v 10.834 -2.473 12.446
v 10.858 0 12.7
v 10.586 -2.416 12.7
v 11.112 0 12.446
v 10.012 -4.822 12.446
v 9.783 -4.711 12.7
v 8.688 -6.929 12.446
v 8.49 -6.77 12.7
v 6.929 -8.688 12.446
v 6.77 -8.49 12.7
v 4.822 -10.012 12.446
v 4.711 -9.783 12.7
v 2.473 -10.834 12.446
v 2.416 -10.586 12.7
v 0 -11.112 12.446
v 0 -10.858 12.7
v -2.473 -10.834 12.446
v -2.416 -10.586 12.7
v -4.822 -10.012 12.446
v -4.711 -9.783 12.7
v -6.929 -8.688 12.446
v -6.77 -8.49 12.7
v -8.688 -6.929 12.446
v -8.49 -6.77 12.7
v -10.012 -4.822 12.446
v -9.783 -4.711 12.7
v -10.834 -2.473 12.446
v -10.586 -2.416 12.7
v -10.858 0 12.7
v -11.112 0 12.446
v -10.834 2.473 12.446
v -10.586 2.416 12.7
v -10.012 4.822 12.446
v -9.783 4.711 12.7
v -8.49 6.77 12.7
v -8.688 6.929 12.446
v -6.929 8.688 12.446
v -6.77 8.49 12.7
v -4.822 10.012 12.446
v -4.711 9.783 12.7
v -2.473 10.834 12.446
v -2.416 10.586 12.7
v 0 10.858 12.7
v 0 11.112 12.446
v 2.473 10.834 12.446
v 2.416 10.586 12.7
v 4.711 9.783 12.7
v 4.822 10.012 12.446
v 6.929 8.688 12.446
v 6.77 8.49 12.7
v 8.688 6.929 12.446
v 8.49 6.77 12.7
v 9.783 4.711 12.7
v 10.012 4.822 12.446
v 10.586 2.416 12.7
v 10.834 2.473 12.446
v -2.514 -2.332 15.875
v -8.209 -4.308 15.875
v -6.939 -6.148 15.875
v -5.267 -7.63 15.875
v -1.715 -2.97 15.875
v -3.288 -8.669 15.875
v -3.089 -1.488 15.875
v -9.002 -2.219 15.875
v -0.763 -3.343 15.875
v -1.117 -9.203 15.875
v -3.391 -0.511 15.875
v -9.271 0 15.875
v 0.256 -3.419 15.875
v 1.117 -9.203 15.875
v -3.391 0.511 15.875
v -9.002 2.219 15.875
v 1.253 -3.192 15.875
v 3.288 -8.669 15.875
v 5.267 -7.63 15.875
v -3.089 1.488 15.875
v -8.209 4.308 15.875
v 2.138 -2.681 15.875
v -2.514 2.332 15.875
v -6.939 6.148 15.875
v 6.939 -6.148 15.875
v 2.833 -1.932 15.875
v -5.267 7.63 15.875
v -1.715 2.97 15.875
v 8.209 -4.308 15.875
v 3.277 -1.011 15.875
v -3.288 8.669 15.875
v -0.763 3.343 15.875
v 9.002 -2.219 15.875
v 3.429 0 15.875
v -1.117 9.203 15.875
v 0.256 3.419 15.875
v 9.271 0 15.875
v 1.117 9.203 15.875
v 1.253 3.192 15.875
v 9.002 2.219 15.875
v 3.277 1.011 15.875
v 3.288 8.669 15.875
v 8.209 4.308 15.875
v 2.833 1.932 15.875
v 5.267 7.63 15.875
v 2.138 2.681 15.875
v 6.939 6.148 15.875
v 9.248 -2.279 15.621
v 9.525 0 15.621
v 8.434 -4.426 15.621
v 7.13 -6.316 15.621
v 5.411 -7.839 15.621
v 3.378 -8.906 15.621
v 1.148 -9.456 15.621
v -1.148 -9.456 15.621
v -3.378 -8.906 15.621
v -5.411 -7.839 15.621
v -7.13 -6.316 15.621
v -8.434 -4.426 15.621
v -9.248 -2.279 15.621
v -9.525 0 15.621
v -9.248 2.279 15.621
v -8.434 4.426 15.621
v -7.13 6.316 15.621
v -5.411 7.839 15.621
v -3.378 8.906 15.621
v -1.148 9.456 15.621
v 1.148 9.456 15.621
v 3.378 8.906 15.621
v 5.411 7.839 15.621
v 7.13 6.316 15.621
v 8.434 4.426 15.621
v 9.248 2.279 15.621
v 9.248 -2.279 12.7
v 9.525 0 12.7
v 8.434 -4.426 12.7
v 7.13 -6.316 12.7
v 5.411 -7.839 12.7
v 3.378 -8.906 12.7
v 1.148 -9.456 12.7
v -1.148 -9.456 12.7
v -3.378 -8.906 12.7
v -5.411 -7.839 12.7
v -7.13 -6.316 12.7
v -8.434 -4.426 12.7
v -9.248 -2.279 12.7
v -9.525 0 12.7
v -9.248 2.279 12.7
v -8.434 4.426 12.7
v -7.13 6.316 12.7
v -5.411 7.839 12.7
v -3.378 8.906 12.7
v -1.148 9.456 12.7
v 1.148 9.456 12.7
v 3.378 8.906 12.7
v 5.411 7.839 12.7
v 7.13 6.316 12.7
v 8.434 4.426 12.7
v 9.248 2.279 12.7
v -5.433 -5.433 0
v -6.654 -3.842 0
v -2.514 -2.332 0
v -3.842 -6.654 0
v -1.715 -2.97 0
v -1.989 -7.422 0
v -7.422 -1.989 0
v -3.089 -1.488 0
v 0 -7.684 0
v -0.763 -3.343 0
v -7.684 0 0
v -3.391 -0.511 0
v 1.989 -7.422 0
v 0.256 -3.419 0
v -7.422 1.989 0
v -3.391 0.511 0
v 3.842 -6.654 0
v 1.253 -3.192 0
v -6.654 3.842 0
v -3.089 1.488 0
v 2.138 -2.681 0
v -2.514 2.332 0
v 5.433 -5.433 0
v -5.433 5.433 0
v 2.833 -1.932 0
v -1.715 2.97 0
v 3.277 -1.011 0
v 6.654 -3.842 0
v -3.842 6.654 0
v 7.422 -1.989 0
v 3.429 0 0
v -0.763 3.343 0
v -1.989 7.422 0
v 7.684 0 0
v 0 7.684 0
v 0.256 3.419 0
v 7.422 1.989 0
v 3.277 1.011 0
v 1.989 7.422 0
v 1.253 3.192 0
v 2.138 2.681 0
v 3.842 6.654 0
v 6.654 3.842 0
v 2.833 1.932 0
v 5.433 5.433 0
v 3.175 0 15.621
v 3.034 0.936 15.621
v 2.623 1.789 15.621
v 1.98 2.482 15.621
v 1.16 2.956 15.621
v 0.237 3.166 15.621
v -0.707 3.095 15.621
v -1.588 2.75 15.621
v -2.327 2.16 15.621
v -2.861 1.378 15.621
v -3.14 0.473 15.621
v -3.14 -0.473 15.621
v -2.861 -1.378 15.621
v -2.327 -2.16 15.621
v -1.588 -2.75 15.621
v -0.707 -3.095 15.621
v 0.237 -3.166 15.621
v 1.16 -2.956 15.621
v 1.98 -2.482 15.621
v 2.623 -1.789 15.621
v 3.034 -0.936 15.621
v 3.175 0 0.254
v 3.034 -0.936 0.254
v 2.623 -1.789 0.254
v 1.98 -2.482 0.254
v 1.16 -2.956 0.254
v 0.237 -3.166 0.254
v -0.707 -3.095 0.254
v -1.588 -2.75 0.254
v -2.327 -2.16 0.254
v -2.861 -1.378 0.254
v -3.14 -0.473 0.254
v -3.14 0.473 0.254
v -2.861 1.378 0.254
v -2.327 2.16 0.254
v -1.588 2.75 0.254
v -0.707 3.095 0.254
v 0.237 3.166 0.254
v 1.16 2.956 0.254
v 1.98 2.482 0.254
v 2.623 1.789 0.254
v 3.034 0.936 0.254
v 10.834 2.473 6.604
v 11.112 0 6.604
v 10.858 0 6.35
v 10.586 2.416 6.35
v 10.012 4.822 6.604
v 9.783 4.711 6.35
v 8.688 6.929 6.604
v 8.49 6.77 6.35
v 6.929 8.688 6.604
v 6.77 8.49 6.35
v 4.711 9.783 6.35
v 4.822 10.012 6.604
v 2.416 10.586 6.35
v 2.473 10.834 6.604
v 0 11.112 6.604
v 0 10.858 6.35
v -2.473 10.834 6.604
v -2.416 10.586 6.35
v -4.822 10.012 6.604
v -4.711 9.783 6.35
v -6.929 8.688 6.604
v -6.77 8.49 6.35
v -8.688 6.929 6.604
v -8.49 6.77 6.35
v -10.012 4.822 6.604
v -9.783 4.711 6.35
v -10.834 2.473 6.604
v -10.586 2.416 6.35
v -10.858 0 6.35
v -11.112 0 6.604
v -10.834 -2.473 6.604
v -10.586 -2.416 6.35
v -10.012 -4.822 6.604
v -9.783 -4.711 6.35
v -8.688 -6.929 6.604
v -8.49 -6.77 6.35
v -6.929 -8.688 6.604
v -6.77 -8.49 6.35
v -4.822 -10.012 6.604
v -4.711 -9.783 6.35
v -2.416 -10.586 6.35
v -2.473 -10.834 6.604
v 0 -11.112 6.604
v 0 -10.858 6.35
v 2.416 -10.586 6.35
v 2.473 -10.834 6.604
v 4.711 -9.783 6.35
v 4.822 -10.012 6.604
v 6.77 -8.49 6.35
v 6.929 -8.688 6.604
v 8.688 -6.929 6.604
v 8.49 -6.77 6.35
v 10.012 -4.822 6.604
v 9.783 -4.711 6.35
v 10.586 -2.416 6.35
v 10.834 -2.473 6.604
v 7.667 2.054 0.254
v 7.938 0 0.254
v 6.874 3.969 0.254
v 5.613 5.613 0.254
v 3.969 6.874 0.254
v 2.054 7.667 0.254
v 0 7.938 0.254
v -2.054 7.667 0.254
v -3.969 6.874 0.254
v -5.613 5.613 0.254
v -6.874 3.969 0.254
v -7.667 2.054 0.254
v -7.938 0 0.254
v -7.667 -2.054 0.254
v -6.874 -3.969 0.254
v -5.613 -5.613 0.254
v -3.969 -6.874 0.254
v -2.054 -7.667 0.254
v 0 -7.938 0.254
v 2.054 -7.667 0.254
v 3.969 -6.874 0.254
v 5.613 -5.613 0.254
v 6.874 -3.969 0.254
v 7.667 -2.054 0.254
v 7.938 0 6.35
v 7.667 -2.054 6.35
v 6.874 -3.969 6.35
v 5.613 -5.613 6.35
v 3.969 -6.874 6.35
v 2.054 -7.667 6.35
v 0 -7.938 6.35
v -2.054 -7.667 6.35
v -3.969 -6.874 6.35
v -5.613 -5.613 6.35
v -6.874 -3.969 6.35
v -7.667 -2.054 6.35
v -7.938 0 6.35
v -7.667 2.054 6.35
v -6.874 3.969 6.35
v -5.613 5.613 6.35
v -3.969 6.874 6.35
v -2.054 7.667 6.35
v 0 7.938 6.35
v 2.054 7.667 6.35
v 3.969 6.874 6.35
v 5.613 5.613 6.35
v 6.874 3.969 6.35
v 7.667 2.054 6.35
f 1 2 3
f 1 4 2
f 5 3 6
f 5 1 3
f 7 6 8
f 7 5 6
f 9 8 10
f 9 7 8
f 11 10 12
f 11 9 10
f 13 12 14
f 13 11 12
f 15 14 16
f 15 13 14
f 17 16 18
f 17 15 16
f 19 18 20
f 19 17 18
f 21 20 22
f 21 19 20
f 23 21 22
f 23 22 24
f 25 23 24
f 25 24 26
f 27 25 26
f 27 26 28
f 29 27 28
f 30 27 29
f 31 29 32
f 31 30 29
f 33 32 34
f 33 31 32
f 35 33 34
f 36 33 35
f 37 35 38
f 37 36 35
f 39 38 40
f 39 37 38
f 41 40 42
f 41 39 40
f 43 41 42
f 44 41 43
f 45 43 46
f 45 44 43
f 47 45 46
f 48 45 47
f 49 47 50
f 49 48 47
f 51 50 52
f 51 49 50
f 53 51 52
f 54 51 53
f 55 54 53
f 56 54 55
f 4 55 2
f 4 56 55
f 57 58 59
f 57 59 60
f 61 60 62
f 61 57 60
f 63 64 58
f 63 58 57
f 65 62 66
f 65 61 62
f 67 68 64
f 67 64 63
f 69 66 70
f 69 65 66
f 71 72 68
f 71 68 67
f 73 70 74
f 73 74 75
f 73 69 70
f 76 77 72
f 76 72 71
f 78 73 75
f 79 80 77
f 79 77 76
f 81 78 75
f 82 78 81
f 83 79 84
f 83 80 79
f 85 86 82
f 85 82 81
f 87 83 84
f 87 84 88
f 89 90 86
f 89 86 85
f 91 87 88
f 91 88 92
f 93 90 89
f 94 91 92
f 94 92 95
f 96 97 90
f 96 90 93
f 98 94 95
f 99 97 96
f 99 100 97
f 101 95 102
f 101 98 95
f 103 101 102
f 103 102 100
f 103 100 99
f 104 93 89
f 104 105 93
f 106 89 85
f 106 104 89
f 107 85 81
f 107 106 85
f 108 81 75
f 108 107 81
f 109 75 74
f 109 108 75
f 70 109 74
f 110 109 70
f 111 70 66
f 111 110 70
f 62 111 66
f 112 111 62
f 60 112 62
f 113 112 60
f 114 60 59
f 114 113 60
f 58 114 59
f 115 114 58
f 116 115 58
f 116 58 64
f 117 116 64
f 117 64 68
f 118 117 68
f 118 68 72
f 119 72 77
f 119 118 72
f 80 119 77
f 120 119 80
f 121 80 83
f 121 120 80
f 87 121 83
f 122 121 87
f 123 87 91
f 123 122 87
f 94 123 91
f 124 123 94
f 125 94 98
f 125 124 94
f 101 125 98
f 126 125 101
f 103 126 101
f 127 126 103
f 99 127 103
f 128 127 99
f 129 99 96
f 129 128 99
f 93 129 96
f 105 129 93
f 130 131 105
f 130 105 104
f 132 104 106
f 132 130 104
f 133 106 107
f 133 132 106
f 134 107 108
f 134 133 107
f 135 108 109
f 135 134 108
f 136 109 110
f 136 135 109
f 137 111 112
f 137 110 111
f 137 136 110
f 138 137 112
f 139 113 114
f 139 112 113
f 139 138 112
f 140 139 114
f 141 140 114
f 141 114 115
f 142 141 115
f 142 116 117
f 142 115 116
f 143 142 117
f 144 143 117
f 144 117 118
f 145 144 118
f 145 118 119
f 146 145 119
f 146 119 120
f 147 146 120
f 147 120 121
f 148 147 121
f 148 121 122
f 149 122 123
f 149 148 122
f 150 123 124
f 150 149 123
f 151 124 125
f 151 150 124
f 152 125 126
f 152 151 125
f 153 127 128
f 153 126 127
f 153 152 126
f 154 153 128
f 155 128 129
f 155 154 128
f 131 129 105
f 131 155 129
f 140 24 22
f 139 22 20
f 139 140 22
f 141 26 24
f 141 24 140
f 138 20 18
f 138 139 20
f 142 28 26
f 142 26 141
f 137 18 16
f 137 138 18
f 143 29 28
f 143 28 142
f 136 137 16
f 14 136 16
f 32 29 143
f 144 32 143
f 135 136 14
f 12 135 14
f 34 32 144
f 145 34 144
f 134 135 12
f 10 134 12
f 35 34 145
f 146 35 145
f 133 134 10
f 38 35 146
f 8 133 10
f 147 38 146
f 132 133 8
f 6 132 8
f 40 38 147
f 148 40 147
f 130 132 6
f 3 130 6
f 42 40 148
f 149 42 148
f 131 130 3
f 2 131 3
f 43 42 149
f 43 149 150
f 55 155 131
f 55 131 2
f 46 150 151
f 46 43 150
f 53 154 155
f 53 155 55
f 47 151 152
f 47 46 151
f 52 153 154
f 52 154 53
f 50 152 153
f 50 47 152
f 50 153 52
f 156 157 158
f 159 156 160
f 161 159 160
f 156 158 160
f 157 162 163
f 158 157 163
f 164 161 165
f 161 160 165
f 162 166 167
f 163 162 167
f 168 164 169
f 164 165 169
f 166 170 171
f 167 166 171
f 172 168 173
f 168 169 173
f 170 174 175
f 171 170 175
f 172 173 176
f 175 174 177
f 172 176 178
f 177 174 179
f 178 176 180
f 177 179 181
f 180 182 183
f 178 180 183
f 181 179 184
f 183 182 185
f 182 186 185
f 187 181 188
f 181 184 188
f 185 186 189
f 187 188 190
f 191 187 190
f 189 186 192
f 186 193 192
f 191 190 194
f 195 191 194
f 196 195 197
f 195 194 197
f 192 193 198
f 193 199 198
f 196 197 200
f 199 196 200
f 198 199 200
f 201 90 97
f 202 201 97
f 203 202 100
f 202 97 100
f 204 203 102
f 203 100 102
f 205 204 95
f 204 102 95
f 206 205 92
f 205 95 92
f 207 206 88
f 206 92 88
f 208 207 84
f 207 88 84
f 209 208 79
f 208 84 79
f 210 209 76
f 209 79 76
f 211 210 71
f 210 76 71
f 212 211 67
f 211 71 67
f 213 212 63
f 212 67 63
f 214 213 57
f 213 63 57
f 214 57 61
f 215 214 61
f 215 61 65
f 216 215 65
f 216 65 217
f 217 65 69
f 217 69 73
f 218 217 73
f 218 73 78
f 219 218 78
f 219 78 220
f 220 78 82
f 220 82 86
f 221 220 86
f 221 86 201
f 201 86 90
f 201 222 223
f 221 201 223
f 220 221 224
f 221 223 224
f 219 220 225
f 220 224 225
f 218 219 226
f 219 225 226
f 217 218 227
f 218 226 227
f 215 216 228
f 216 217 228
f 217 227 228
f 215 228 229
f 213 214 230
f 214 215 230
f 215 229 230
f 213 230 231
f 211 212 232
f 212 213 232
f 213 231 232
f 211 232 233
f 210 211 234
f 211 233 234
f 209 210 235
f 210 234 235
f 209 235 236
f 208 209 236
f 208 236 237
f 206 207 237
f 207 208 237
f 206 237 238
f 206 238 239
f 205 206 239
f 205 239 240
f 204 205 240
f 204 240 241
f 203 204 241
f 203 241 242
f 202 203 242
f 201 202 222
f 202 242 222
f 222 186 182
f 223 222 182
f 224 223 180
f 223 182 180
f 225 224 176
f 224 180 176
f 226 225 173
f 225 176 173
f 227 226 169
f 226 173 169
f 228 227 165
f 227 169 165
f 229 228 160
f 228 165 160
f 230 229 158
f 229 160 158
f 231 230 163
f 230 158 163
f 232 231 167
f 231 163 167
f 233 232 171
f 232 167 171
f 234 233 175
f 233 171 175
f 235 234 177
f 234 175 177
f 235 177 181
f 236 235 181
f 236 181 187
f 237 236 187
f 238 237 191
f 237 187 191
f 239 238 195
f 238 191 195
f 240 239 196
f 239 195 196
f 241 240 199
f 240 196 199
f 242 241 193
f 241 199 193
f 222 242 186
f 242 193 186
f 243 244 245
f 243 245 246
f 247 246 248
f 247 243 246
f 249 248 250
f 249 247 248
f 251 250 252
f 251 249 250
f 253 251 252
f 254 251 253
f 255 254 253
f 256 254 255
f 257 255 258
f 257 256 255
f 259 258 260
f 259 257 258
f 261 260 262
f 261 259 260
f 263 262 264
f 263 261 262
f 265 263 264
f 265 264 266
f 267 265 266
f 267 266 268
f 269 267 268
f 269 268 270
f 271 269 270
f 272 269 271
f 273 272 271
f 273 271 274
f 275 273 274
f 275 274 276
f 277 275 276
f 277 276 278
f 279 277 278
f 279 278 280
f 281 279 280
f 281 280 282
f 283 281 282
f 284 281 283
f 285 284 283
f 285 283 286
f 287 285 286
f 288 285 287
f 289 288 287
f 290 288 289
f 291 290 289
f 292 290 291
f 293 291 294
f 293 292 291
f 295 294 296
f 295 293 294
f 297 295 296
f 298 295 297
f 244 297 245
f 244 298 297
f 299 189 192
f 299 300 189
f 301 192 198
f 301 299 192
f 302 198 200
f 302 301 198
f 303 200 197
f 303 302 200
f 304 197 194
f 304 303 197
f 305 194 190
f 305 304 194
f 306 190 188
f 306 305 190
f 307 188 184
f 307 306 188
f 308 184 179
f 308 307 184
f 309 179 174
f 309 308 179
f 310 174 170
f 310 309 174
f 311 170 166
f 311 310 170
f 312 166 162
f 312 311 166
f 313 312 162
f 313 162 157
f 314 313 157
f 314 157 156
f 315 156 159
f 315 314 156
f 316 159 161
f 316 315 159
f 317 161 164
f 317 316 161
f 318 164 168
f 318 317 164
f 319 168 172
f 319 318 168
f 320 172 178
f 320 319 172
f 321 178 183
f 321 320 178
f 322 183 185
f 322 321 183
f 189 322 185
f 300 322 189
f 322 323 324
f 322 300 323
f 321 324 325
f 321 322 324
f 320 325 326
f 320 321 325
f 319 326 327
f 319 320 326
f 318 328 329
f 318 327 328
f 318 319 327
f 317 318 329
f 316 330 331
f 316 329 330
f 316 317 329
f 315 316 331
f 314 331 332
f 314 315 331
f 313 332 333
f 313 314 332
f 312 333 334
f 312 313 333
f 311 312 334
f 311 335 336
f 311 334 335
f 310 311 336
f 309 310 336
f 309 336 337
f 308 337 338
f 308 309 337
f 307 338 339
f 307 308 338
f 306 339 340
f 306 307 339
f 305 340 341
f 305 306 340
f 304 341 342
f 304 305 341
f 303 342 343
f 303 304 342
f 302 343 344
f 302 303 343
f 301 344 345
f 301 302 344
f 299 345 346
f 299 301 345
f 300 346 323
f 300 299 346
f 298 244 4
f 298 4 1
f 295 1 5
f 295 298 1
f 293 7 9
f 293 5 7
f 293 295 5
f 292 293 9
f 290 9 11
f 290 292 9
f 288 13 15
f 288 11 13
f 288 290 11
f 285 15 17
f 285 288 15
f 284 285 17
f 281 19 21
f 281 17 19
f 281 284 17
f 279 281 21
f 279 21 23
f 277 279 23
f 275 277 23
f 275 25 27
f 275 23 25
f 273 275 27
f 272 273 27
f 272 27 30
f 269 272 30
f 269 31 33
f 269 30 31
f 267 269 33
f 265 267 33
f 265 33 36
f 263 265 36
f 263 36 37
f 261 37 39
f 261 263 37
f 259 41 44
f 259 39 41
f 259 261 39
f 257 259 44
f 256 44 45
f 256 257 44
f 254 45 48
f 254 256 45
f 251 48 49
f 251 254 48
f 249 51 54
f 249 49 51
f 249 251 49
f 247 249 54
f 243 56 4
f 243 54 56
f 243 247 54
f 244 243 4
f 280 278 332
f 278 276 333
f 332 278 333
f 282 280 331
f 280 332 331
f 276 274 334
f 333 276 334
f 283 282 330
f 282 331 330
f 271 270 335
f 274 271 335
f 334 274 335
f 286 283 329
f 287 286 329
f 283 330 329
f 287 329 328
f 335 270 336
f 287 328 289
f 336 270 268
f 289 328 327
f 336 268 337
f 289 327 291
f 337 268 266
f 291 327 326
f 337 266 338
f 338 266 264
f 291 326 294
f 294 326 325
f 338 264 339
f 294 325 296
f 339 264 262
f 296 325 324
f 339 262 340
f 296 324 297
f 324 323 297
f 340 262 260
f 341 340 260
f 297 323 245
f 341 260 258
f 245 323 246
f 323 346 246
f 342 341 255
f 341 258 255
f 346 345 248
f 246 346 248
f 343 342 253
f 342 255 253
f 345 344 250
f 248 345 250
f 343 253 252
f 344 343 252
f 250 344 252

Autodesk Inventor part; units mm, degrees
ref_plane "YZ Plane" through (0, 0, 0) normal (1, 0, 0) x (0, 1, 0)
ref_plane "XZ Plane" through (0, 0, 0) normal (0, 1, 0) x (-1, 0, 0)
ref_plane "XY Plane" through (0, 0, 0) normal (0, 0, 1) x (1, 0, 0)
sketch "Sketch1" plane through (0, 0, 0) normal (0, 0, 1) x (1, 0, 0)
  circle A0 centre (0, 0) radius 7.9375
  circle A1 centre (0, 0) radius 3.175
extrude "Extrusion1" add sketch "Sketch1" along normal blind 6.35
sketch "Sketch2" plane through (0, 0, 6.35) normal (0, 0, 1) x (1, 0, 0)
  circle A0 centre (0, 0) radius 3.175 projected
  circle A1 centre (0, 0) radius 7.9375 projected
  circle A2 centre (0, 0) radius 11.1125
extrude "Extrusion2" add sketch "Sketch2" along normal blind 6.35 contours A1 | A2
sketch "Sketch3" plane through (0, 0, 12.7) normal (0, 0, 1) x (1, 0, 0)
  circle A0 centre (0, 0) radius 3.175 projected
  circle A1 centre (0, 0) radius 11.1125 projected
  circle A2 centre (0, 0) radius 9.525
extrude "Extrusion3" add sketch "Sketch3" along normal blind 3.175 contours A2
chamfer "Chamfer1" distance 0.254 angle 45 6 edges at (-9.525, 0, 15.875) (-3.175, 0, 15.875) (-11.1125, 0, 12.7) (-11.1125, 0, 6.35) (-7.9375, 0, 0) (-3.175, 0, 0)
properties part number "cyl head"
